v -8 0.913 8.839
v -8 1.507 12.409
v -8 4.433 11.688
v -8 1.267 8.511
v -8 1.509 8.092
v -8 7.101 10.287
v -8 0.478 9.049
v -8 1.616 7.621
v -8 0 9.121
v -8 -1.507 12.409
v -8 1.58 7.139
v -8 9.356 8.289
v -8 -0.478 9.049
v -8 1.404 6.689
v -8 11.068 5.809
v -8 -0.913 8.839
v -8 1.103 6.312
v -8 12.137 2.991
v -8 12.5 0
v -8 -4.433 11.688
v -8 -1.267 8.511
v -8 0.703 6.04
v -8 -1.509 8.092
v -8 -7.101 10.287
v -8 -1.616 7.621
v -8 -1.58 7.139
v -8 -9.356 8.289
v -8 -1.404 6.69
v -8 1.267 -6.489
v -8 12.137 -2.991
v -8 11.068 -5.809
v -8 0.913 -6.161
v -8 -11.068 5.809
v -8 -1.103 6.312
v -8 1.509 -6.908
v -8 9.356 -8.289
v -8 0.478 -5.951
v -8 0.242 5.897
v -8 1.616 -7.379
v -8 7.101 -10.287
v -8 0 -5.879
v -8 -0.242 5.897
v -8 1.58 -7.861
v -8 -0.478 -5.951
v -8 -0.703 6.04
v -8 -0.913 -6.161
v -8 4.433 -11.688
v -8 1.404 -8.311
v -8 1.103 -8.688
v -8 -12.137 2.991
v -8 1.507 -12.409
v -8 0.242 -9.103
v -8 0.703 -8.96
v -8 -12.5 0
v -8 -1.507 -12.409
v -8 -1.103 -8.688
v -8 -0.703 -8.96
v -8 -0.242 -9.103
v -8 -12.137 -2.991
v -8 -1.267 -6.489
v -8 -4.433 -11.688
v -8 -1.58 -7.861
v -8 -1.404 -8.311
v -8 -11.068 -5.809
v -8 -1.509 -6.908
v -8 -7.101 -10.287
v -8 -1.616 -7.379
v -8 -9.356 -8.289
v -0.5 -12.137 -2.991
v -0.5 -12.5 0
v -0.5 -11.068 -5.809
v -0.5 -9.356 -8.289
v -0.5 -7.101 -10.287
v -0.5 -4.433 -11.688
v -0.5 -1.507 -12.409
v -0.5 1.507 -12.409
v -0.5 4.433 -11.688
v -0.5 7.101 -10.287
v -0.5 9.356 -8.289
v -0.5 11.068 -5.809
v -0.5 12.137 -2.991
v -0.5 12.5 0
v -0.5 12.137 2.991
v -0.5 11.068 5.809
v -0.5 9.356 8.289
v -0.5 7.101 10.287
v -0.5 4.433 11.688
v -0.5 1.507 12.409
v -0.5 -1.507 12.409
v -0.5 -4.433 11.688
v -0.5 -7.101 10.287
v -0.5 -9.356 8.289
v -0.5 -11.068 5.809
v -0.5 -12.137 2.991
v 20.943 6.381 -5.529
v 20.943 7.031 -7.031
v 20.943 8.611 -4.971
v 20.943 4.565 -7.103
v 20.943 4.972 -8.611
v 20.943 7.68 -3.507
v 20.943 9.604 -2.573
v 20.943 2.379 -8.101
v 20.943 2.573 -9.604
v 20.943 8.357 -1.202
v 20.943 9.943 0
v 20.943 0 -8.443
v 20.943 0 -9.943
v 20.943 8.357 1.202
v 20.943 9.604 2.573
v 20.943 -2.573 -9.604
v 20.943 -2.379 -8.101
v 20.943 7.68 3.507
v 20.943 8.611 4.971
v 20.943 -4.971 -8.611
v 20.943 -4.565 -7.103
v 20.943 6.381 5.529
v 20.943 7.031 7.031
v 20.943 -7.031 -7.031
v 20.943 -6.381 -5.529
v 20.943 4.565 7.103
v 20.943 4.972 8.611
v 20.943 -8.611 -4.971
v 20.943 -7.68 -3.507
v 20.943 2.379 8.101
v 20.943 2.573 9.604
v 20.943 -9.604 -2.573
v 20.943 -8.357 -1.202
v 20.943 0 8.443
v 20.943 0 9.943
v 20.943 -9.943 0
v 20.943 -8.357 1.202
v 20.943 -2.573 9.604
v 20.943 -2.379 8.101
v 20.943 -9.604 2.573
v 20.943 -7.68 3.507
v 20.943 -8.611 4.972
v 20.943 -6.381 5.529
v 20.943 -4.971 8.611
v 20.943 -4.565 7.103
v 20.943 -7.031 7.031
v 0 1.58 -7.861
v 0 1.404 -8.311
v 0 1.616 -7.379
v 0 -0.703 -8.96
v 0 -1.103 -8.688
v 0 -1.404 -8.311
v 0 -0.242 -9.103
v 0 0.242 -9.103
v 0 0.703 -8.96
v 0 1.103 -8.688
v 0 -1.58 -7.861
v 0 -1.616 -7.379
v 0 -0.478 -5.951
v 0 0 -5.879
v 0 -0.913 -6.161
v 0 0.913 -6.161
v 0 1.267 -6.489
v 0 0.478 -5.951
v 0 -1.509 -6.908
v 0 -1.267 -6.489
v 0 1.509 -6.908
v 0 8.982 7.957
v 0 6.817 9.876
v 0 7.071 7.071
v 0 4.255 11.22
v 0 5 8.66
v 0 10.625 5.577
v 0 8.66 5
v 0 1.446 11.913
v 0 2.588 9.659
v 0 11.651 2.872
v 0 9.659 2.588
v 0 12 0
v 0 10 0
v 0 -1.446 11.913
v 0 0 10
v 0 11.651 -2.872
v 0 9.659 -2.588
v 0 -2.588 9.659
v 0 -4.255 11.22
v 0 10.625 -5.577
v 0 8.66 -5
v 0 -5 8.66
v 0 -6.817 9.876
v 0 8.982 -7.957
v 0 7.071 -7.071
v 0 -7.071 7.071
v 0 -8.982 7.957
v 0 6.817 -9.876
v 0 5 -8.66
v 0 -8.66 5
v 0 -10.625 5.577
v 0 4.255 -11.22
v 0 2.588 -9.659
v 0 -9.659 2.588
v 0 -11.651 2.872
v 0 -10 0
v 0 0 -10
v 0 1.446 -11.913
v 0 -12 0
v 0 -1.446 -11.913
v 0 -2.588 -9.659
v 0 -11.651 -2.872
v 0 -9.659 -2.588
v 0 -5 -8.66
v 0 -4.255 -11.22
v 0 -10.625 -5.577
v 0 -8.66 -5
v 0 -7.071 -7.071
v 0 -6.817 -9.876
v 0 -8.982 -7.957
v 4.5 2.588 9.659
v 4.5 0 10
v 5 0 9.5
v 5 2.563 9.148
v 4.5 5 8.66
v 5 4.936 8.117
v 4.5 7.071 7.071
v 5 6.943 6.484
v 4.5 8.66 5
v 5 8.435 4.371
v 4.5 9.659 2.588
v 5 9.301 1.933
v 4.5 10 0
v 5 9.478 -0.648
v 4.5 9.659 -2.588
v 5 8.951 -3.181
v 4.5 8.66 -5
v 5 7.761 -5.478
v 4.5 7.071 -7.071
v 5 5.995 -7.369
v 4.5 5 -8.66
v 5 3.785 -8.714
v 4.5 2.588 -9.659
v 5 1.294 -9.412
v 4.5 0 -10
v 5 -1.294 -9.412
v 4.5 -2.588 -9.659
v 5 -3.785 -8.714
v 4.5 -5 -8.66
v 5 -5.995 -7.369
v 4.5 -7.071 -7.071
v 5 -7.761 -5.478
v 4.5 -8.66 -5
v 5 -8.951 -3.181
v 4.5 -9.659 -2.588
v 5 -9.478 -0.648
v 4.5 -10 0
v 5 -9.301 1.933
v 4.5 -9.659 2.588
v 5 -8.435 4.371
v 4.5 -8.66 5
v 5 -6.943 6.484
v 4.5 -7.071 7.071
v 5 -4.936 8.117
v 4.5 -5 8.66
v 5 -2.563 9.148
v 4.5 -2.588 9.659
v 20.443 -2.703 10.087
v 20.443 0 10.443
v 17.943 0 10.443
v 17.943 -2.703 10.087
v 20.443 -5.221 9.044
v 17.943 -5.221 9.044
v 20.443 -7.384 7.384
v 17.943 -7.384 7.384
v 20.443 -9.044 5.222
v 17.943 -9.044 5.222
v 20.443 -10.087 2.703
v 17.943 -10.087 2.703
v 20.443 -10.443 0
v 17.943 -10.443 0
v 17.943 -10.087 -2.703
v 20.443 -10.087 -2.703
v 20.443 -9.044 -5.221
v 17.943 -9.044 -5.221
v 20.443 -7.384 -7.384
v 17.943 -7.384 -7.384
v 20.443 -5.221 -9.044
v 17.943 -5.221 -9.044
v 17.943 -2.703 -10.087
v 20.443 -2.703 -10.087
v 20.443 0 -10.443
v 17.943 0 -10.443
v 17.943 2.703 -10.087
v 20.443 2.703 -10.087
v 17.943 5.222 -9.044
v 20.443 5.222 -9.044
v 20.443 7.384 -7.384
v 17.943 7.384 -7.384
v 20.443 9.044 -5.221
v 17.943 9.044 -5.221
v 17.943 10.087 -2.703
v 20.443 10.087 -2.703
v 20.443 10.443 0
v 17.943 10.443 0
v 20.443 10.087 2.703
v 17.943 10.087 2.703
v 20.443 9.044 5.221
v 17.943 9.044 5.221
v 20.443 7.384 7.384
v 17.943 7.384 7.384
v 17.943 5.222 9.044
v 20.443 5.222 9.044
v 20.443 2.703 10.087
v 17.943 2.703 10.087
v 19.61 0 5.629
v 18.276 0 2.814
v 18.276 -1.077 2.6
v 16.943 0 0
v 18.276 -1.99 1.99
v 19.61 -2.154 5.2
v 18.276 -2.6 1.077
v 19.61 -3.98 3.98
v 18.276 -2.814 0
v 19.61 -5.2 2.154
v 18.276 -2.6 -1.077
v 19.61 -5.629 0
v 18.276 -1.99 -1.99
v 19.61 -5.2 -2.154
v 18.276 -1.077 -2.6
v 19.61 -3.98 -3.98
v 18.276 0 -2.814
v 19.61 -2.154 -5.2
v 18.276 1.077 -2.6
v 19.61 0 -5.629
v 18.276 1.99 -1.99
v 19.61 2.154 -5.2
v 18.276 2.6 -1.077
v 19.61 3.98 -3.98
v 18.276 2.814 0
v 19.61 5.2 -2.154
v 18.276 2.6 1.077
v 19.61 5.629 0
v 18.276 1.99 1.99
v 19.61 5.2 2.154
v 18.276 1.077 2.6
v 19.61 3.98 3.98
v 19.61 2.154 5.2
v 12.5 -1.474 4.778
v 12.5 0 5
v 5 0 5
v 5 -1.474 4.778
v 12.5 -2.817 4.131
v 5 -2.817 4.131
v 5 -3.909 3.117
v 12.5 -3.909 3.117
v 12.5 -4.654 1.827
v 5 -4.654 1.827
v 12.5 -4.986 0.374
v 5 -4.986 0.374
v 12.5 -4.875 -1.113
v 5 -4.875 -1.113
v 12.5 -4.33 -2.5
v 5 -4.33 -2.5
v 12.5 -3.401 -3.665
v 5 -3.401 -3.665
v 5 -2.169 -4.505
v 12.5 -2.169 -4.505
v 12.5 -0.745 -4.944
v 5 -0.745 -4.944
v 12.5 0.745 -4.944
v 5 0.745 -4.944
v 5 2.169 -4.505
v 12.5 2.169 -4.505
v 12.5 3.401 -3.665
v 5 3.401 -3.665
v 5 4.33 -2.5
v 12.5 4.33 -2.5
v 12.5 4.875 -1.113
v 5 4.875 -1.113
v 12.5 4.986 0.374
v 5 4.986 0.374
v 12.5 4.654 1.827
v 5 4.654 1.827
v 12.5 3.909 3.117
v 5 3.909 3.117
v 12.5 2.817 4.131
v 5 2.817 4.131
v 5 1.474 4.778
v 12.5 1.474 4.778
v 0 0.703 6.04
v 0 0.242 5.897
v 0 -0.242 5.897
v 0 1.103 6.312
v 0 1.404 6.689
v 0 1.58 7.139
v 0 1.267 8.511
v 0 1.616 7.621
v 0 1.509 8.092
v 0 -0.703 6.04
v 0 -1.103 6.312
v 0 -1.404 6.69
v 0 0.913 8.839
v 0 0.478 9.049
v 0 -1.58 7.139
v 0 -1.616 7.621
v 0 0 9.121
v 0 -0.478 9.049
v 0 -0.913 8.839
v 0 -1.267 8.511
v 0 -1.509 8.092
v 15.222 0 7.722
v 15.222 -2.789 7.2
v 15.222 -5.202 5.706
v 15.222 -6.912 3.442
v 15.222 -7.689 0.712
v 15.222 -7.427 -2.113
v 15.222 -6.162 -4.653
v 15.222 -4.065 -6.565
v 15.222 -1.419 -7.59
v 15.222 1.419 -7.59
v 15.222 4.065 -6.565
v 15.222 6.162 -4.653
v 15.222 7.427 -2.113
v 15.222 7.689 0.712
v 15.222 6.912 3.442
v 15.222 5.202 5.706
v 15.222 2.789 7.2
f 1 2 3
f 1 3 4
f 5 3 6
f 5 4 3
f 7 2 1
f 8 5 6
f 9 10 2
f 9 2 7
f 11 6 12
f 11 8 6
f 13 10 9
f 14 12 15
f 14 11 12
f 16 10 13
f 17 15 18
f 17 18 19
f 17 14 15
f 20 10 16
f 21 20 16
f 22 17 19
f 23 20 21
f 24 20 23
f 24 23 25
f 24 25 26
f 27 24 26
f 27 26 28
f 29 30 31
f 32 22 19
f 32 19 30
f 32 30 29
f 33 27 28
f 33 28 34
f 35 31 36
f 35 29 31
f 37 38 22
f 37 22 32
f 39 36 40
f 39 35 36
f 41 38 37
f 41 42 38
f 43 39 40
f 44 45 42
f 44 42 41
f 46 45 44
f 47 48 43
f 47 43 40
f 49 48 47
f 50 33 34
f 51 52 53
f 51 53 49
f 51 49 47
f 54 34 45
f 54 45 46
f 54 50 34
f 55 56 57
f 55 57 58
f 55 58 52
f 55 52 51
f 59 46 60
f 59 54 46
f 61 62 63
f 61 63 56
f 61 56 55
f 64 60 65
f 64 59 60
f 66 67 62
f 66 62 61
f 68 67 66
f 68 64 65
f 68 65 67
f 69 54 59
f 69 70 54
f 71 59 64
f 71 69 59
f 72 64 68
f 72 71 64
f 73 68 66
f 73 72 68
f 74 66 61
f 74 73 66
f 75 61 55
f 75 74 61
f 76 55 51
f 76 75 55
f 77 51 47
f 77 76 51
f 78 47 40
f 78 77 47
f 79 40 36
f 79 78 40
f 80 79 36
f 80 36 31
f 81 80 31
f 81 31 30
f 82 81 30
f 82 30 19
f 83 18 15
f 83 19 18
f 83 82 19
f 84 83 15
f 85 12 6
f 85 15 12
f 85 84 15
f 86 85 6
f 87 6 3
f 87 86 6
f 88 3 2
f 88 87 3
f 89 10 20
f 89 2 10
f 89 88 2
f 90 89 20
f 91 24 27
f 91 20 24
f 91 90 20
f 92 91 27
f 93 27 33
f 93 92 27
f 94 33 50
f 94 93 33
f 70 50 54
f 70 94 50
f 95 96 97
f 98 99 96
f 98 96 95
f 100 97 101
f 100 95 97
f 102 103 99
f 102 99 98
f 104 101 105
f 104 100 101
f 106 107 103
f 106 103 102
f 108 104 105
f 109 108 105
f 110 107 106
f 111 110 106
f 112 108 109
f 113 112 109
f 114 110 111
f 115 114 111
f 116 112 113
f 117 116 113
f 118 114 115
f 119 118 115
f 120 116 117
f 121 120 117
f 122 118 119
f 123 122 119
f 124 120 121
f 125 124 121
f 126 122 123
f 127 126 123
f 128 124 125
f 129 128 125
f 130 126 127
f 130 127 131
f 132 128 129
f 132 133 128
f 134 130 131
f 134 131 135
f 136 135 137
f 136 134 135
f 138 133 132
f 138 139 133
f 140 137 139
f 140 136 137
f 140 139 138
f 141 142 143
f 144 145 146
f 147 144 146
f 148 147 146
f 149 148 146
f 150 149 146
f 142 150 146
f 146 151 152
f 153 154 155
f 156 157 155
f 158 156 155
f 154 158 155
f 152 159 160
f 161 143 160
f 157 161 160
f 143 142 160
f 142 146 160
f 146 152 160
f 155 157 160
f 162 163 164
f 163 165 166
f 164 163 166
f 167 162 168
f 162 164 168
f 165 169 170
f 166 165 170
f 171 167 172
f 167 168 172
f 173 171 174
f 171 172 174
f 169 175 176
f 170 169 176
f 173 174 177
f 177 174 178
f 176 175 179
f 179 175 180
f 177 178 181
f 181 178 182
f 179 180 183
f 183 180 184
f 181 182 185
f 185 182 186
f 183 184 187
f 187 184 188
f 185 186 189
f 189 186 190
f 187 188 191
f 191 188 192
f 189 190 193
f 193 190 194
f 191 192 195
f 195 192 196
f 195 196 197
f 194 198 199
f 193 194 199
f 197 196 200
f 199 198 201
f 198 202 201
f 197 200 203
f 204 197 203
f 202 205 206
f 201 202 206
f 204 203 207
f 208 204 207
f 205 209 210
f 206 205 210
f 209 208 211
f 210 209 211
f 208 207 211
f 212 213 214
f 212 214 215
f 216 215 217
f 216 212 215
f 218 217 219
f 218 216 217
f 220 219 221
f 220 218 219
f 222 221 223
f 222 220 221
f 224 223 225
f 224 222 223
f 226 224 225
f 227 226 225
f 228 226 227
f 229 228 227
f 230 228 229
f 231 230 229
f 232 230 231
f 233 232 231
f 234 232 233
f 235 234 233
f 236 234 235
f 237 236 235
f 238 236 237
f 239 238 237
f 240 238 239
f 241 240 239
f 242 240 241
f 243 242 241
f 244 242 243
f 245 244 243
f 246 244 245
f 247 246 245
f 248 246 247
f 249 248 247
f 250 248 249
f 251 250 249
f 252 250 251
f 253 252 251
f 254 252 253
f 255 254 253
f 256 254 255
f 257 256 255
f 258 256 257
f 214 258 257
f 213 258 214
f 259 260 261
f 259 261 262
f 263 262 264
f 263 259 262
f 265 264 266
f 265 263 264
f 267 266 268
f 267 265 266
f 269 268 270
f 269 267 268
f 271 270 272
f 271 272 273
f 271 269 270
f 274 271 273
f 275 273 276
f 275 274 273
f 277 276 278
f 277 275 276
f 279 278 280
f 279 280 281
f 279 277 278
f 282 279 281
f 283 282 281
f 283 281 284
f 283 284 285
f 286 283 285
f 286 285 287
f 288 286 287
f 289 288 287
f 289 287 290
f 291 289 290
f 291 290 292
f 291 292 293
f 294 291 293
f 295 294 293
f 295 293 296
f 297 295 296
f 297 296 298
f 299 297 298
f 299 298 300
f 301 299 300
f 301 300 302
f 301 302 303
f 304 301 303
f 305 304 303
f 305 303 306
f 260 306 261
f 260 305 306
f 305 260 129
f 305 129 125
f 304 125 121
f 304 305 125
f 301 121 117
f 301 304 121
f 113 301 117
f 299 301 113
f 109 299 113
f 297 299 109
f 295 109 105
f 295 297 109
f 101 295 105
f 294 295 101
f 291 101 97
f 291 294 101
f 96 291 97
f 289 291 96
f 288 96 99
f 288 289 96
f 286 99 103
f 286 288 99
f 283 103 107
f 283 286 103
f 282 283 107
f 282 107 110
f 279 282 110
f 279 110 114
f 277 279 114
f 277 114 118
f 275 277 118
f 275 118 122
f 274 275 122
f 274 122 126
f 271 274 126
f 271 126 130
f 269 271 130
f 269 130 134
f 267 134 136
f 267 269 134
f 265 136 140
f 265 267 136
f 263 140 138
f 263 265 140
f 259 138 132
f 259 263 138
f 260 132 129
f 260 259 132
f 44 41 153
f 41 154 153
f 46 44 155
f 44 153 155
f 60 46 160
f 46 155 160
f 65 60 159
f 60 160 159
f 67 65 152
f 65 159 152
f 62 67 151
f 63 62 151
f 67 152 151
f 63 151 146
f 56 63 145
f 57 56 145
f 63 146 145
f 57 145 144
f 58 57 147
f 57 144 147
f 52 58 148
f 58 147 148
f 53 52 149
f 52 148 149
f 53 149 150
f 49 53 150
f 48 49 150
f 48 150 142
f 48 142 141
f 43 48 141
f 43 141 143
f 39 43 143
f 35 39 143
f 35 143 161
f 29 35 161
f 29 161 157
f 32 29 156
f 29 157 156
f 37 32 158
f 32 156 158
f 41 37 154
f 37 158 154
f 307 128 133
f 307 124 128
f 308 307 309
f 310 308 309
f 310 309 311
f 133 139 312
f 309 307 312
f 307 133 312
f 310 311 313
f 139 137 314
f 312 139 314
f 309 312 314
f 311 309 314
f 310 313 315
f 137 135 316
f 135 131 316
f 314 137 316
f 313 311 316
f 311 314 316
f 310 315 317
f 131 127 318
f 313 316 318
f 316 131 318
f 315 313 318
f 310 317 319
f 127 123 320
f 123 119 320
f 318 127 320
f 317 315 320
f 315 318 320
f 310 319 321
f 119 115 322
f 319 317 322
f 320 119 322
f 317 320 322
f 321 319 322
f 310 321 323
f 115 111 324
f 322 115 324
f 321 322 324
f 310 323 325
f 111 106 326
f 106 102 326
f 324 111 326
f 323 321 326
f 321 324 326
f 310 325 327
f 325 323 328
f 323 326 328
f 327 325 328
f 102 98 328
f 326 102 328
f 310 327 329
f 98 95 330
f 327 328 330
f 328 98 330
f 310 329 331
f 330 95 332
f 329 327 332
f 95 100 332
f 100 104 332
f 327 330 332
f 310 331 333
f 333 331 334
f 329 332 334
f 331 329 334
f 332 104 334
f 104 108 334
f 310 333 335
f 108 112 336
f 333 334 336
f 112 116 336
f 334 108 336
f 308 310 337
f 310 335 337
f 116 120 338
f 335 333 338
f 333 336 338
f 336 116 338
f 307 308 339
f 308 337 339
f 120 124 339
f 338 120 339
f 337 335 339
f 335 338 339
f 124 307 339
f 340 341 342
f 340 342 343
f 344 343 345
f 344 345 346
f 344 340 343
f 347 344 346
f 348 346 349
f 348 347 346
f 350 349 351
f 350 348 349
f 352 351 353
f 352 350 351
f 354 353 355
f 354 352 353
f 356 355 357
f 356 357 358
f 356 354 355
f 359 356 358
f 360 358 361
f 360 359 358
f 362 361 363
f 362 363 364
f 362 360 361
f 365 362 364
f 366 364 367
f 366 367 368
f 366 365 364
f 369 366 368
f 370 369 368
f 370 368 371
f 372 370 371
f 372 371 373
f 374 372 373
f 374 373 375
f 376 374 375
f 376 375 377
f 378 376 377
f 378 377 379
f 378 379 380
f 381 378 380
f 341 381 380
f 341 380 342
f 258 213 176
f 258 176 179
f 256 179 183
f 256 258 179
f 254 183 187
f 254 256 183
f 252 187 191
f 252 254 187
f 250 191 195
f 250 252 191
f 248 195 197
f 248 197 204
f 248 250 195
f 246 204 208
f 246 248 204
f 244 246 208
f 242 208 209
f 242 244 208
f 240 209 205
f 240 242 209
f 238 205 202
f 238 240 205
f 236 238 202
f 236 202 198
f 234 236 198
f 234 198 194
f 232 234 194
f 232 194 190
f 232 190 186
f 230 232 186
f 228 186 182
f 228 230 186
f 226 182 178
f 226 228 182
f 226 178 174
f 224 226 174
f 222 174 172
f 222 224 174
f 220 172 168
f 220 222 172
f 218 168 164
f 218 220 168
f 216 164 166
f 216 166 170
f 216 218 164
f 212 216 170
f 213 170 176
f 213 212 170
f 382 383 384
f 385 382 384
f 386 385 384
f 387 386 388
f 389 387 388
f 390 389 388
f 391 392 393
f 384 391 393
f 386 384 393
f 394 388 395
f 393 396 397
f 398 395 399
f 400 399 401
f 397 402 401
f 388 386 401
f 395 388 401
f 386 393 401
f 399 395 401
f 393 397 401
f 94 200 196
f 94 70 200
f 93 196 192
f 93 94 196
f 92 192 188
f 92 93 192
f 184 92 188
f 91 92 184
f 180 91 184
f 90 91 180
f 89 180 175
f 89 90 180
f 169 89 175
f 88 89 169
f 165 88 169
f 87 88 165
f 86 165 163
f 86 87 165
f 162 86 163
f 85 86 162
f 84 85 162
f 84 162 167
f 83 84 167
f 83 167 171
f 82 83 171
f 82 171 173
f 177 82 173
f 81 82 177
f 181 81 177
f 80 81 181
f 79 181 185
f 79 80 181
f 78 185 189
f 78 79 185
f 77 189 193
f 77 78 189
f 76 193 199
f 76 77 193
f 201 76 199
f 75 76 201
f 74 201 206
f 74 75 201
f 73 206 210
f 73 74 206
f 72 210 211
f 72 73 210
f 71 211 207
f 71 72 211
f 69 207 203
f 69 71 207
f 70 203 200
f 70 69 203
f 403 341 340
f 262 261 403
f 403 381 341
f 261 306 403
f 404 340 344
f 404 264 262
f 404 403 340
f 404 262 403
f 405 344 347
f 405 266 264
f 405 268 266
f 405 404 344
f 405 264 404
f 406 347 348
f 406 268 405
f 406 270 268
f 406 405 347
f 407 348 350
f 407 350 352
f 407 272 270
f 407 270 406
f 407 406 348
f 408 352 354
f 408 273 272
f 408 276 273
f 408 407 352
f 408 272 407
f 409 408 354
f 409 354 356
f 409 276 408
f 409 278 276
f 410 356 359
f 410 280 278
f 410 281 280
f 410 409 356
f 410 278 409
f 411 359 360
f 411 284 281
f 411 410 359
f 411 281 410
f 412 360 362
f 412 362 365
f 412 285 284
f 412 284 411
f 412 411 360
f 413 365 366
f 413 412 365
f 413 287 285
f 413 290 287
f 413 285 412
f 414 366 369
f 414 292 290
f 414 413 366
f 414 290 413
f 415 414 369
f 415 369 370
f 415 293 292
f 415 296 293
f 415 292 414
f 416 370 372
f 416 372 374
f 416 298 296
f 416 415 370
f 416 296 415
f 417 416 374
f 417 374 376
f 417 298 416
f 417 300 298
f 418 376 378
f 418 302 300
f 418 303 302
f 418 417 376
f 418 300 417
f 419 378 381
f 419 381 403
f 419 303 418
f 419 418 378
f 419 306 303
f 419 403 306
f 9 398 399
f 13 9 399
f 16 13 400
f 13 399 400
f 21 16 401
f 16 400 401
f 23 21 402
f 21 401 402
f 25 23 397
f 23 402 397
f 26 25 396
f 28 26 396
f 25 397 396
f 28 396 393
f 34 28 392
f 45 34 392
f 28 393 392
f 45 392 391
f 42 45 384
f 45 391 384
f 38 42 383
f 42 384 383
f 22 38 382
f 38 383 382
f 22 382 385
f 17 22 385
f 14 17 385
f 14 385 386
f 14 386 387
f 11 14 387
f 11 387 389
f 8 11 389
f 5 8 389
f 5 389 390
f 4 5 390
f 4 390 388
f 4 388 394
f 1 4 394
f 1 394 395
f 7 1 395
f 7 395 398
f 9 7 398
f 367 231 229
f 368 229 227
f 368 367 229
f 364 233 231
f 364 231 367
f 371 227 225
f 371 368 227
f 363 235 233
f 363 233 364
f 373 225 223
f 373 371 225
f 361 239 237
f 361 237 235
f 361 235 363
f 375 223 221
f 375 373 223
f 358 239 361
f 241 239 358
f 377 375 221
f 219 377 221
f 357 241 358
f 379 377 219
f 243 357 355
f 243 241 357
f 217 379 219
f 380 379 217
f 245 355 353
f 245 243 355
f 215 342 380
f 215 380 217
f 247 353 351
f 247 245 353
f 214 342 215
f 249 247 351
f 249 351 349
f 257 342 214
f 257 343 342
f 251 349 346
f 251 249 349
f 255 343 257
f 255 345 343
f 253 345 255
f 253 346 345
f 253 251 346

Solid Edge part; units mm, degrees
sketch "Sketch1" plane through (0, 0, 0) normal (0, -1, 0) x (1, 0, 0)
  line L0 (0, 10) -> (5, 10)
  line L1 (5, 10) -> (5, 5)
  line L2 (5, 5) -> (12.5, 5)
  line L3 (12.5, 5) -> (17.943, 10.443)
  line L4 (17.943, 10.443) -> (20.943, 10.443)
  line L5 (20.943, 10.443) -> (20.943, 8.443)
  line L6 (20.943, 8.443) -> (16.943, 0)
  line L7 (16.943, 0) -> (0, 0)
  line L8 (0, 0) -> (0, 10)
  dimension "D1" = 10
  dimension "D2" = 5
  dimension "D3" = 5
  dimension "D4" = 7.5
  dimension "D5" = 3
  dimension "D6" = 2
  dimension "D7" = 4
  dimension "D8" = 20.943
  dimension "D9" = 10.443
revolve "RevolvedProtrusion1" add sketch "Sketch1" angle 360 about axis through (-60, 0, 0) along (1, 0, 0)
sketch "Sketch2" plane through (0, 0, 0) normal (-1, 0, 0) x (0, -1, 0)
  circle A0 centre (0, 0) radius 12.5
  dimension "D1" = 25
extrude "Protrusion1" add sketch "Sketch2" along normal blind 8
hole "Bohrung_1" at (-8, 0, 7.5) direction (1, 0, 0) diameter 3.242 depth 8
hole "Hole1" at (-8, 0, -7.5) direction (1, 0, 0) diameter 3.242 depth 8
chamfer "Fase_1" distance 0.5 angle 45 1 edges at (0, 12.5, 0)
chamfer "Fase_2" distance 0.5 angle 45 1 edges at (5, 0, -10)
chamfer "Fase_3" distance 0.5 angle 45 1 edges at (20.943, 0, -10.443)
